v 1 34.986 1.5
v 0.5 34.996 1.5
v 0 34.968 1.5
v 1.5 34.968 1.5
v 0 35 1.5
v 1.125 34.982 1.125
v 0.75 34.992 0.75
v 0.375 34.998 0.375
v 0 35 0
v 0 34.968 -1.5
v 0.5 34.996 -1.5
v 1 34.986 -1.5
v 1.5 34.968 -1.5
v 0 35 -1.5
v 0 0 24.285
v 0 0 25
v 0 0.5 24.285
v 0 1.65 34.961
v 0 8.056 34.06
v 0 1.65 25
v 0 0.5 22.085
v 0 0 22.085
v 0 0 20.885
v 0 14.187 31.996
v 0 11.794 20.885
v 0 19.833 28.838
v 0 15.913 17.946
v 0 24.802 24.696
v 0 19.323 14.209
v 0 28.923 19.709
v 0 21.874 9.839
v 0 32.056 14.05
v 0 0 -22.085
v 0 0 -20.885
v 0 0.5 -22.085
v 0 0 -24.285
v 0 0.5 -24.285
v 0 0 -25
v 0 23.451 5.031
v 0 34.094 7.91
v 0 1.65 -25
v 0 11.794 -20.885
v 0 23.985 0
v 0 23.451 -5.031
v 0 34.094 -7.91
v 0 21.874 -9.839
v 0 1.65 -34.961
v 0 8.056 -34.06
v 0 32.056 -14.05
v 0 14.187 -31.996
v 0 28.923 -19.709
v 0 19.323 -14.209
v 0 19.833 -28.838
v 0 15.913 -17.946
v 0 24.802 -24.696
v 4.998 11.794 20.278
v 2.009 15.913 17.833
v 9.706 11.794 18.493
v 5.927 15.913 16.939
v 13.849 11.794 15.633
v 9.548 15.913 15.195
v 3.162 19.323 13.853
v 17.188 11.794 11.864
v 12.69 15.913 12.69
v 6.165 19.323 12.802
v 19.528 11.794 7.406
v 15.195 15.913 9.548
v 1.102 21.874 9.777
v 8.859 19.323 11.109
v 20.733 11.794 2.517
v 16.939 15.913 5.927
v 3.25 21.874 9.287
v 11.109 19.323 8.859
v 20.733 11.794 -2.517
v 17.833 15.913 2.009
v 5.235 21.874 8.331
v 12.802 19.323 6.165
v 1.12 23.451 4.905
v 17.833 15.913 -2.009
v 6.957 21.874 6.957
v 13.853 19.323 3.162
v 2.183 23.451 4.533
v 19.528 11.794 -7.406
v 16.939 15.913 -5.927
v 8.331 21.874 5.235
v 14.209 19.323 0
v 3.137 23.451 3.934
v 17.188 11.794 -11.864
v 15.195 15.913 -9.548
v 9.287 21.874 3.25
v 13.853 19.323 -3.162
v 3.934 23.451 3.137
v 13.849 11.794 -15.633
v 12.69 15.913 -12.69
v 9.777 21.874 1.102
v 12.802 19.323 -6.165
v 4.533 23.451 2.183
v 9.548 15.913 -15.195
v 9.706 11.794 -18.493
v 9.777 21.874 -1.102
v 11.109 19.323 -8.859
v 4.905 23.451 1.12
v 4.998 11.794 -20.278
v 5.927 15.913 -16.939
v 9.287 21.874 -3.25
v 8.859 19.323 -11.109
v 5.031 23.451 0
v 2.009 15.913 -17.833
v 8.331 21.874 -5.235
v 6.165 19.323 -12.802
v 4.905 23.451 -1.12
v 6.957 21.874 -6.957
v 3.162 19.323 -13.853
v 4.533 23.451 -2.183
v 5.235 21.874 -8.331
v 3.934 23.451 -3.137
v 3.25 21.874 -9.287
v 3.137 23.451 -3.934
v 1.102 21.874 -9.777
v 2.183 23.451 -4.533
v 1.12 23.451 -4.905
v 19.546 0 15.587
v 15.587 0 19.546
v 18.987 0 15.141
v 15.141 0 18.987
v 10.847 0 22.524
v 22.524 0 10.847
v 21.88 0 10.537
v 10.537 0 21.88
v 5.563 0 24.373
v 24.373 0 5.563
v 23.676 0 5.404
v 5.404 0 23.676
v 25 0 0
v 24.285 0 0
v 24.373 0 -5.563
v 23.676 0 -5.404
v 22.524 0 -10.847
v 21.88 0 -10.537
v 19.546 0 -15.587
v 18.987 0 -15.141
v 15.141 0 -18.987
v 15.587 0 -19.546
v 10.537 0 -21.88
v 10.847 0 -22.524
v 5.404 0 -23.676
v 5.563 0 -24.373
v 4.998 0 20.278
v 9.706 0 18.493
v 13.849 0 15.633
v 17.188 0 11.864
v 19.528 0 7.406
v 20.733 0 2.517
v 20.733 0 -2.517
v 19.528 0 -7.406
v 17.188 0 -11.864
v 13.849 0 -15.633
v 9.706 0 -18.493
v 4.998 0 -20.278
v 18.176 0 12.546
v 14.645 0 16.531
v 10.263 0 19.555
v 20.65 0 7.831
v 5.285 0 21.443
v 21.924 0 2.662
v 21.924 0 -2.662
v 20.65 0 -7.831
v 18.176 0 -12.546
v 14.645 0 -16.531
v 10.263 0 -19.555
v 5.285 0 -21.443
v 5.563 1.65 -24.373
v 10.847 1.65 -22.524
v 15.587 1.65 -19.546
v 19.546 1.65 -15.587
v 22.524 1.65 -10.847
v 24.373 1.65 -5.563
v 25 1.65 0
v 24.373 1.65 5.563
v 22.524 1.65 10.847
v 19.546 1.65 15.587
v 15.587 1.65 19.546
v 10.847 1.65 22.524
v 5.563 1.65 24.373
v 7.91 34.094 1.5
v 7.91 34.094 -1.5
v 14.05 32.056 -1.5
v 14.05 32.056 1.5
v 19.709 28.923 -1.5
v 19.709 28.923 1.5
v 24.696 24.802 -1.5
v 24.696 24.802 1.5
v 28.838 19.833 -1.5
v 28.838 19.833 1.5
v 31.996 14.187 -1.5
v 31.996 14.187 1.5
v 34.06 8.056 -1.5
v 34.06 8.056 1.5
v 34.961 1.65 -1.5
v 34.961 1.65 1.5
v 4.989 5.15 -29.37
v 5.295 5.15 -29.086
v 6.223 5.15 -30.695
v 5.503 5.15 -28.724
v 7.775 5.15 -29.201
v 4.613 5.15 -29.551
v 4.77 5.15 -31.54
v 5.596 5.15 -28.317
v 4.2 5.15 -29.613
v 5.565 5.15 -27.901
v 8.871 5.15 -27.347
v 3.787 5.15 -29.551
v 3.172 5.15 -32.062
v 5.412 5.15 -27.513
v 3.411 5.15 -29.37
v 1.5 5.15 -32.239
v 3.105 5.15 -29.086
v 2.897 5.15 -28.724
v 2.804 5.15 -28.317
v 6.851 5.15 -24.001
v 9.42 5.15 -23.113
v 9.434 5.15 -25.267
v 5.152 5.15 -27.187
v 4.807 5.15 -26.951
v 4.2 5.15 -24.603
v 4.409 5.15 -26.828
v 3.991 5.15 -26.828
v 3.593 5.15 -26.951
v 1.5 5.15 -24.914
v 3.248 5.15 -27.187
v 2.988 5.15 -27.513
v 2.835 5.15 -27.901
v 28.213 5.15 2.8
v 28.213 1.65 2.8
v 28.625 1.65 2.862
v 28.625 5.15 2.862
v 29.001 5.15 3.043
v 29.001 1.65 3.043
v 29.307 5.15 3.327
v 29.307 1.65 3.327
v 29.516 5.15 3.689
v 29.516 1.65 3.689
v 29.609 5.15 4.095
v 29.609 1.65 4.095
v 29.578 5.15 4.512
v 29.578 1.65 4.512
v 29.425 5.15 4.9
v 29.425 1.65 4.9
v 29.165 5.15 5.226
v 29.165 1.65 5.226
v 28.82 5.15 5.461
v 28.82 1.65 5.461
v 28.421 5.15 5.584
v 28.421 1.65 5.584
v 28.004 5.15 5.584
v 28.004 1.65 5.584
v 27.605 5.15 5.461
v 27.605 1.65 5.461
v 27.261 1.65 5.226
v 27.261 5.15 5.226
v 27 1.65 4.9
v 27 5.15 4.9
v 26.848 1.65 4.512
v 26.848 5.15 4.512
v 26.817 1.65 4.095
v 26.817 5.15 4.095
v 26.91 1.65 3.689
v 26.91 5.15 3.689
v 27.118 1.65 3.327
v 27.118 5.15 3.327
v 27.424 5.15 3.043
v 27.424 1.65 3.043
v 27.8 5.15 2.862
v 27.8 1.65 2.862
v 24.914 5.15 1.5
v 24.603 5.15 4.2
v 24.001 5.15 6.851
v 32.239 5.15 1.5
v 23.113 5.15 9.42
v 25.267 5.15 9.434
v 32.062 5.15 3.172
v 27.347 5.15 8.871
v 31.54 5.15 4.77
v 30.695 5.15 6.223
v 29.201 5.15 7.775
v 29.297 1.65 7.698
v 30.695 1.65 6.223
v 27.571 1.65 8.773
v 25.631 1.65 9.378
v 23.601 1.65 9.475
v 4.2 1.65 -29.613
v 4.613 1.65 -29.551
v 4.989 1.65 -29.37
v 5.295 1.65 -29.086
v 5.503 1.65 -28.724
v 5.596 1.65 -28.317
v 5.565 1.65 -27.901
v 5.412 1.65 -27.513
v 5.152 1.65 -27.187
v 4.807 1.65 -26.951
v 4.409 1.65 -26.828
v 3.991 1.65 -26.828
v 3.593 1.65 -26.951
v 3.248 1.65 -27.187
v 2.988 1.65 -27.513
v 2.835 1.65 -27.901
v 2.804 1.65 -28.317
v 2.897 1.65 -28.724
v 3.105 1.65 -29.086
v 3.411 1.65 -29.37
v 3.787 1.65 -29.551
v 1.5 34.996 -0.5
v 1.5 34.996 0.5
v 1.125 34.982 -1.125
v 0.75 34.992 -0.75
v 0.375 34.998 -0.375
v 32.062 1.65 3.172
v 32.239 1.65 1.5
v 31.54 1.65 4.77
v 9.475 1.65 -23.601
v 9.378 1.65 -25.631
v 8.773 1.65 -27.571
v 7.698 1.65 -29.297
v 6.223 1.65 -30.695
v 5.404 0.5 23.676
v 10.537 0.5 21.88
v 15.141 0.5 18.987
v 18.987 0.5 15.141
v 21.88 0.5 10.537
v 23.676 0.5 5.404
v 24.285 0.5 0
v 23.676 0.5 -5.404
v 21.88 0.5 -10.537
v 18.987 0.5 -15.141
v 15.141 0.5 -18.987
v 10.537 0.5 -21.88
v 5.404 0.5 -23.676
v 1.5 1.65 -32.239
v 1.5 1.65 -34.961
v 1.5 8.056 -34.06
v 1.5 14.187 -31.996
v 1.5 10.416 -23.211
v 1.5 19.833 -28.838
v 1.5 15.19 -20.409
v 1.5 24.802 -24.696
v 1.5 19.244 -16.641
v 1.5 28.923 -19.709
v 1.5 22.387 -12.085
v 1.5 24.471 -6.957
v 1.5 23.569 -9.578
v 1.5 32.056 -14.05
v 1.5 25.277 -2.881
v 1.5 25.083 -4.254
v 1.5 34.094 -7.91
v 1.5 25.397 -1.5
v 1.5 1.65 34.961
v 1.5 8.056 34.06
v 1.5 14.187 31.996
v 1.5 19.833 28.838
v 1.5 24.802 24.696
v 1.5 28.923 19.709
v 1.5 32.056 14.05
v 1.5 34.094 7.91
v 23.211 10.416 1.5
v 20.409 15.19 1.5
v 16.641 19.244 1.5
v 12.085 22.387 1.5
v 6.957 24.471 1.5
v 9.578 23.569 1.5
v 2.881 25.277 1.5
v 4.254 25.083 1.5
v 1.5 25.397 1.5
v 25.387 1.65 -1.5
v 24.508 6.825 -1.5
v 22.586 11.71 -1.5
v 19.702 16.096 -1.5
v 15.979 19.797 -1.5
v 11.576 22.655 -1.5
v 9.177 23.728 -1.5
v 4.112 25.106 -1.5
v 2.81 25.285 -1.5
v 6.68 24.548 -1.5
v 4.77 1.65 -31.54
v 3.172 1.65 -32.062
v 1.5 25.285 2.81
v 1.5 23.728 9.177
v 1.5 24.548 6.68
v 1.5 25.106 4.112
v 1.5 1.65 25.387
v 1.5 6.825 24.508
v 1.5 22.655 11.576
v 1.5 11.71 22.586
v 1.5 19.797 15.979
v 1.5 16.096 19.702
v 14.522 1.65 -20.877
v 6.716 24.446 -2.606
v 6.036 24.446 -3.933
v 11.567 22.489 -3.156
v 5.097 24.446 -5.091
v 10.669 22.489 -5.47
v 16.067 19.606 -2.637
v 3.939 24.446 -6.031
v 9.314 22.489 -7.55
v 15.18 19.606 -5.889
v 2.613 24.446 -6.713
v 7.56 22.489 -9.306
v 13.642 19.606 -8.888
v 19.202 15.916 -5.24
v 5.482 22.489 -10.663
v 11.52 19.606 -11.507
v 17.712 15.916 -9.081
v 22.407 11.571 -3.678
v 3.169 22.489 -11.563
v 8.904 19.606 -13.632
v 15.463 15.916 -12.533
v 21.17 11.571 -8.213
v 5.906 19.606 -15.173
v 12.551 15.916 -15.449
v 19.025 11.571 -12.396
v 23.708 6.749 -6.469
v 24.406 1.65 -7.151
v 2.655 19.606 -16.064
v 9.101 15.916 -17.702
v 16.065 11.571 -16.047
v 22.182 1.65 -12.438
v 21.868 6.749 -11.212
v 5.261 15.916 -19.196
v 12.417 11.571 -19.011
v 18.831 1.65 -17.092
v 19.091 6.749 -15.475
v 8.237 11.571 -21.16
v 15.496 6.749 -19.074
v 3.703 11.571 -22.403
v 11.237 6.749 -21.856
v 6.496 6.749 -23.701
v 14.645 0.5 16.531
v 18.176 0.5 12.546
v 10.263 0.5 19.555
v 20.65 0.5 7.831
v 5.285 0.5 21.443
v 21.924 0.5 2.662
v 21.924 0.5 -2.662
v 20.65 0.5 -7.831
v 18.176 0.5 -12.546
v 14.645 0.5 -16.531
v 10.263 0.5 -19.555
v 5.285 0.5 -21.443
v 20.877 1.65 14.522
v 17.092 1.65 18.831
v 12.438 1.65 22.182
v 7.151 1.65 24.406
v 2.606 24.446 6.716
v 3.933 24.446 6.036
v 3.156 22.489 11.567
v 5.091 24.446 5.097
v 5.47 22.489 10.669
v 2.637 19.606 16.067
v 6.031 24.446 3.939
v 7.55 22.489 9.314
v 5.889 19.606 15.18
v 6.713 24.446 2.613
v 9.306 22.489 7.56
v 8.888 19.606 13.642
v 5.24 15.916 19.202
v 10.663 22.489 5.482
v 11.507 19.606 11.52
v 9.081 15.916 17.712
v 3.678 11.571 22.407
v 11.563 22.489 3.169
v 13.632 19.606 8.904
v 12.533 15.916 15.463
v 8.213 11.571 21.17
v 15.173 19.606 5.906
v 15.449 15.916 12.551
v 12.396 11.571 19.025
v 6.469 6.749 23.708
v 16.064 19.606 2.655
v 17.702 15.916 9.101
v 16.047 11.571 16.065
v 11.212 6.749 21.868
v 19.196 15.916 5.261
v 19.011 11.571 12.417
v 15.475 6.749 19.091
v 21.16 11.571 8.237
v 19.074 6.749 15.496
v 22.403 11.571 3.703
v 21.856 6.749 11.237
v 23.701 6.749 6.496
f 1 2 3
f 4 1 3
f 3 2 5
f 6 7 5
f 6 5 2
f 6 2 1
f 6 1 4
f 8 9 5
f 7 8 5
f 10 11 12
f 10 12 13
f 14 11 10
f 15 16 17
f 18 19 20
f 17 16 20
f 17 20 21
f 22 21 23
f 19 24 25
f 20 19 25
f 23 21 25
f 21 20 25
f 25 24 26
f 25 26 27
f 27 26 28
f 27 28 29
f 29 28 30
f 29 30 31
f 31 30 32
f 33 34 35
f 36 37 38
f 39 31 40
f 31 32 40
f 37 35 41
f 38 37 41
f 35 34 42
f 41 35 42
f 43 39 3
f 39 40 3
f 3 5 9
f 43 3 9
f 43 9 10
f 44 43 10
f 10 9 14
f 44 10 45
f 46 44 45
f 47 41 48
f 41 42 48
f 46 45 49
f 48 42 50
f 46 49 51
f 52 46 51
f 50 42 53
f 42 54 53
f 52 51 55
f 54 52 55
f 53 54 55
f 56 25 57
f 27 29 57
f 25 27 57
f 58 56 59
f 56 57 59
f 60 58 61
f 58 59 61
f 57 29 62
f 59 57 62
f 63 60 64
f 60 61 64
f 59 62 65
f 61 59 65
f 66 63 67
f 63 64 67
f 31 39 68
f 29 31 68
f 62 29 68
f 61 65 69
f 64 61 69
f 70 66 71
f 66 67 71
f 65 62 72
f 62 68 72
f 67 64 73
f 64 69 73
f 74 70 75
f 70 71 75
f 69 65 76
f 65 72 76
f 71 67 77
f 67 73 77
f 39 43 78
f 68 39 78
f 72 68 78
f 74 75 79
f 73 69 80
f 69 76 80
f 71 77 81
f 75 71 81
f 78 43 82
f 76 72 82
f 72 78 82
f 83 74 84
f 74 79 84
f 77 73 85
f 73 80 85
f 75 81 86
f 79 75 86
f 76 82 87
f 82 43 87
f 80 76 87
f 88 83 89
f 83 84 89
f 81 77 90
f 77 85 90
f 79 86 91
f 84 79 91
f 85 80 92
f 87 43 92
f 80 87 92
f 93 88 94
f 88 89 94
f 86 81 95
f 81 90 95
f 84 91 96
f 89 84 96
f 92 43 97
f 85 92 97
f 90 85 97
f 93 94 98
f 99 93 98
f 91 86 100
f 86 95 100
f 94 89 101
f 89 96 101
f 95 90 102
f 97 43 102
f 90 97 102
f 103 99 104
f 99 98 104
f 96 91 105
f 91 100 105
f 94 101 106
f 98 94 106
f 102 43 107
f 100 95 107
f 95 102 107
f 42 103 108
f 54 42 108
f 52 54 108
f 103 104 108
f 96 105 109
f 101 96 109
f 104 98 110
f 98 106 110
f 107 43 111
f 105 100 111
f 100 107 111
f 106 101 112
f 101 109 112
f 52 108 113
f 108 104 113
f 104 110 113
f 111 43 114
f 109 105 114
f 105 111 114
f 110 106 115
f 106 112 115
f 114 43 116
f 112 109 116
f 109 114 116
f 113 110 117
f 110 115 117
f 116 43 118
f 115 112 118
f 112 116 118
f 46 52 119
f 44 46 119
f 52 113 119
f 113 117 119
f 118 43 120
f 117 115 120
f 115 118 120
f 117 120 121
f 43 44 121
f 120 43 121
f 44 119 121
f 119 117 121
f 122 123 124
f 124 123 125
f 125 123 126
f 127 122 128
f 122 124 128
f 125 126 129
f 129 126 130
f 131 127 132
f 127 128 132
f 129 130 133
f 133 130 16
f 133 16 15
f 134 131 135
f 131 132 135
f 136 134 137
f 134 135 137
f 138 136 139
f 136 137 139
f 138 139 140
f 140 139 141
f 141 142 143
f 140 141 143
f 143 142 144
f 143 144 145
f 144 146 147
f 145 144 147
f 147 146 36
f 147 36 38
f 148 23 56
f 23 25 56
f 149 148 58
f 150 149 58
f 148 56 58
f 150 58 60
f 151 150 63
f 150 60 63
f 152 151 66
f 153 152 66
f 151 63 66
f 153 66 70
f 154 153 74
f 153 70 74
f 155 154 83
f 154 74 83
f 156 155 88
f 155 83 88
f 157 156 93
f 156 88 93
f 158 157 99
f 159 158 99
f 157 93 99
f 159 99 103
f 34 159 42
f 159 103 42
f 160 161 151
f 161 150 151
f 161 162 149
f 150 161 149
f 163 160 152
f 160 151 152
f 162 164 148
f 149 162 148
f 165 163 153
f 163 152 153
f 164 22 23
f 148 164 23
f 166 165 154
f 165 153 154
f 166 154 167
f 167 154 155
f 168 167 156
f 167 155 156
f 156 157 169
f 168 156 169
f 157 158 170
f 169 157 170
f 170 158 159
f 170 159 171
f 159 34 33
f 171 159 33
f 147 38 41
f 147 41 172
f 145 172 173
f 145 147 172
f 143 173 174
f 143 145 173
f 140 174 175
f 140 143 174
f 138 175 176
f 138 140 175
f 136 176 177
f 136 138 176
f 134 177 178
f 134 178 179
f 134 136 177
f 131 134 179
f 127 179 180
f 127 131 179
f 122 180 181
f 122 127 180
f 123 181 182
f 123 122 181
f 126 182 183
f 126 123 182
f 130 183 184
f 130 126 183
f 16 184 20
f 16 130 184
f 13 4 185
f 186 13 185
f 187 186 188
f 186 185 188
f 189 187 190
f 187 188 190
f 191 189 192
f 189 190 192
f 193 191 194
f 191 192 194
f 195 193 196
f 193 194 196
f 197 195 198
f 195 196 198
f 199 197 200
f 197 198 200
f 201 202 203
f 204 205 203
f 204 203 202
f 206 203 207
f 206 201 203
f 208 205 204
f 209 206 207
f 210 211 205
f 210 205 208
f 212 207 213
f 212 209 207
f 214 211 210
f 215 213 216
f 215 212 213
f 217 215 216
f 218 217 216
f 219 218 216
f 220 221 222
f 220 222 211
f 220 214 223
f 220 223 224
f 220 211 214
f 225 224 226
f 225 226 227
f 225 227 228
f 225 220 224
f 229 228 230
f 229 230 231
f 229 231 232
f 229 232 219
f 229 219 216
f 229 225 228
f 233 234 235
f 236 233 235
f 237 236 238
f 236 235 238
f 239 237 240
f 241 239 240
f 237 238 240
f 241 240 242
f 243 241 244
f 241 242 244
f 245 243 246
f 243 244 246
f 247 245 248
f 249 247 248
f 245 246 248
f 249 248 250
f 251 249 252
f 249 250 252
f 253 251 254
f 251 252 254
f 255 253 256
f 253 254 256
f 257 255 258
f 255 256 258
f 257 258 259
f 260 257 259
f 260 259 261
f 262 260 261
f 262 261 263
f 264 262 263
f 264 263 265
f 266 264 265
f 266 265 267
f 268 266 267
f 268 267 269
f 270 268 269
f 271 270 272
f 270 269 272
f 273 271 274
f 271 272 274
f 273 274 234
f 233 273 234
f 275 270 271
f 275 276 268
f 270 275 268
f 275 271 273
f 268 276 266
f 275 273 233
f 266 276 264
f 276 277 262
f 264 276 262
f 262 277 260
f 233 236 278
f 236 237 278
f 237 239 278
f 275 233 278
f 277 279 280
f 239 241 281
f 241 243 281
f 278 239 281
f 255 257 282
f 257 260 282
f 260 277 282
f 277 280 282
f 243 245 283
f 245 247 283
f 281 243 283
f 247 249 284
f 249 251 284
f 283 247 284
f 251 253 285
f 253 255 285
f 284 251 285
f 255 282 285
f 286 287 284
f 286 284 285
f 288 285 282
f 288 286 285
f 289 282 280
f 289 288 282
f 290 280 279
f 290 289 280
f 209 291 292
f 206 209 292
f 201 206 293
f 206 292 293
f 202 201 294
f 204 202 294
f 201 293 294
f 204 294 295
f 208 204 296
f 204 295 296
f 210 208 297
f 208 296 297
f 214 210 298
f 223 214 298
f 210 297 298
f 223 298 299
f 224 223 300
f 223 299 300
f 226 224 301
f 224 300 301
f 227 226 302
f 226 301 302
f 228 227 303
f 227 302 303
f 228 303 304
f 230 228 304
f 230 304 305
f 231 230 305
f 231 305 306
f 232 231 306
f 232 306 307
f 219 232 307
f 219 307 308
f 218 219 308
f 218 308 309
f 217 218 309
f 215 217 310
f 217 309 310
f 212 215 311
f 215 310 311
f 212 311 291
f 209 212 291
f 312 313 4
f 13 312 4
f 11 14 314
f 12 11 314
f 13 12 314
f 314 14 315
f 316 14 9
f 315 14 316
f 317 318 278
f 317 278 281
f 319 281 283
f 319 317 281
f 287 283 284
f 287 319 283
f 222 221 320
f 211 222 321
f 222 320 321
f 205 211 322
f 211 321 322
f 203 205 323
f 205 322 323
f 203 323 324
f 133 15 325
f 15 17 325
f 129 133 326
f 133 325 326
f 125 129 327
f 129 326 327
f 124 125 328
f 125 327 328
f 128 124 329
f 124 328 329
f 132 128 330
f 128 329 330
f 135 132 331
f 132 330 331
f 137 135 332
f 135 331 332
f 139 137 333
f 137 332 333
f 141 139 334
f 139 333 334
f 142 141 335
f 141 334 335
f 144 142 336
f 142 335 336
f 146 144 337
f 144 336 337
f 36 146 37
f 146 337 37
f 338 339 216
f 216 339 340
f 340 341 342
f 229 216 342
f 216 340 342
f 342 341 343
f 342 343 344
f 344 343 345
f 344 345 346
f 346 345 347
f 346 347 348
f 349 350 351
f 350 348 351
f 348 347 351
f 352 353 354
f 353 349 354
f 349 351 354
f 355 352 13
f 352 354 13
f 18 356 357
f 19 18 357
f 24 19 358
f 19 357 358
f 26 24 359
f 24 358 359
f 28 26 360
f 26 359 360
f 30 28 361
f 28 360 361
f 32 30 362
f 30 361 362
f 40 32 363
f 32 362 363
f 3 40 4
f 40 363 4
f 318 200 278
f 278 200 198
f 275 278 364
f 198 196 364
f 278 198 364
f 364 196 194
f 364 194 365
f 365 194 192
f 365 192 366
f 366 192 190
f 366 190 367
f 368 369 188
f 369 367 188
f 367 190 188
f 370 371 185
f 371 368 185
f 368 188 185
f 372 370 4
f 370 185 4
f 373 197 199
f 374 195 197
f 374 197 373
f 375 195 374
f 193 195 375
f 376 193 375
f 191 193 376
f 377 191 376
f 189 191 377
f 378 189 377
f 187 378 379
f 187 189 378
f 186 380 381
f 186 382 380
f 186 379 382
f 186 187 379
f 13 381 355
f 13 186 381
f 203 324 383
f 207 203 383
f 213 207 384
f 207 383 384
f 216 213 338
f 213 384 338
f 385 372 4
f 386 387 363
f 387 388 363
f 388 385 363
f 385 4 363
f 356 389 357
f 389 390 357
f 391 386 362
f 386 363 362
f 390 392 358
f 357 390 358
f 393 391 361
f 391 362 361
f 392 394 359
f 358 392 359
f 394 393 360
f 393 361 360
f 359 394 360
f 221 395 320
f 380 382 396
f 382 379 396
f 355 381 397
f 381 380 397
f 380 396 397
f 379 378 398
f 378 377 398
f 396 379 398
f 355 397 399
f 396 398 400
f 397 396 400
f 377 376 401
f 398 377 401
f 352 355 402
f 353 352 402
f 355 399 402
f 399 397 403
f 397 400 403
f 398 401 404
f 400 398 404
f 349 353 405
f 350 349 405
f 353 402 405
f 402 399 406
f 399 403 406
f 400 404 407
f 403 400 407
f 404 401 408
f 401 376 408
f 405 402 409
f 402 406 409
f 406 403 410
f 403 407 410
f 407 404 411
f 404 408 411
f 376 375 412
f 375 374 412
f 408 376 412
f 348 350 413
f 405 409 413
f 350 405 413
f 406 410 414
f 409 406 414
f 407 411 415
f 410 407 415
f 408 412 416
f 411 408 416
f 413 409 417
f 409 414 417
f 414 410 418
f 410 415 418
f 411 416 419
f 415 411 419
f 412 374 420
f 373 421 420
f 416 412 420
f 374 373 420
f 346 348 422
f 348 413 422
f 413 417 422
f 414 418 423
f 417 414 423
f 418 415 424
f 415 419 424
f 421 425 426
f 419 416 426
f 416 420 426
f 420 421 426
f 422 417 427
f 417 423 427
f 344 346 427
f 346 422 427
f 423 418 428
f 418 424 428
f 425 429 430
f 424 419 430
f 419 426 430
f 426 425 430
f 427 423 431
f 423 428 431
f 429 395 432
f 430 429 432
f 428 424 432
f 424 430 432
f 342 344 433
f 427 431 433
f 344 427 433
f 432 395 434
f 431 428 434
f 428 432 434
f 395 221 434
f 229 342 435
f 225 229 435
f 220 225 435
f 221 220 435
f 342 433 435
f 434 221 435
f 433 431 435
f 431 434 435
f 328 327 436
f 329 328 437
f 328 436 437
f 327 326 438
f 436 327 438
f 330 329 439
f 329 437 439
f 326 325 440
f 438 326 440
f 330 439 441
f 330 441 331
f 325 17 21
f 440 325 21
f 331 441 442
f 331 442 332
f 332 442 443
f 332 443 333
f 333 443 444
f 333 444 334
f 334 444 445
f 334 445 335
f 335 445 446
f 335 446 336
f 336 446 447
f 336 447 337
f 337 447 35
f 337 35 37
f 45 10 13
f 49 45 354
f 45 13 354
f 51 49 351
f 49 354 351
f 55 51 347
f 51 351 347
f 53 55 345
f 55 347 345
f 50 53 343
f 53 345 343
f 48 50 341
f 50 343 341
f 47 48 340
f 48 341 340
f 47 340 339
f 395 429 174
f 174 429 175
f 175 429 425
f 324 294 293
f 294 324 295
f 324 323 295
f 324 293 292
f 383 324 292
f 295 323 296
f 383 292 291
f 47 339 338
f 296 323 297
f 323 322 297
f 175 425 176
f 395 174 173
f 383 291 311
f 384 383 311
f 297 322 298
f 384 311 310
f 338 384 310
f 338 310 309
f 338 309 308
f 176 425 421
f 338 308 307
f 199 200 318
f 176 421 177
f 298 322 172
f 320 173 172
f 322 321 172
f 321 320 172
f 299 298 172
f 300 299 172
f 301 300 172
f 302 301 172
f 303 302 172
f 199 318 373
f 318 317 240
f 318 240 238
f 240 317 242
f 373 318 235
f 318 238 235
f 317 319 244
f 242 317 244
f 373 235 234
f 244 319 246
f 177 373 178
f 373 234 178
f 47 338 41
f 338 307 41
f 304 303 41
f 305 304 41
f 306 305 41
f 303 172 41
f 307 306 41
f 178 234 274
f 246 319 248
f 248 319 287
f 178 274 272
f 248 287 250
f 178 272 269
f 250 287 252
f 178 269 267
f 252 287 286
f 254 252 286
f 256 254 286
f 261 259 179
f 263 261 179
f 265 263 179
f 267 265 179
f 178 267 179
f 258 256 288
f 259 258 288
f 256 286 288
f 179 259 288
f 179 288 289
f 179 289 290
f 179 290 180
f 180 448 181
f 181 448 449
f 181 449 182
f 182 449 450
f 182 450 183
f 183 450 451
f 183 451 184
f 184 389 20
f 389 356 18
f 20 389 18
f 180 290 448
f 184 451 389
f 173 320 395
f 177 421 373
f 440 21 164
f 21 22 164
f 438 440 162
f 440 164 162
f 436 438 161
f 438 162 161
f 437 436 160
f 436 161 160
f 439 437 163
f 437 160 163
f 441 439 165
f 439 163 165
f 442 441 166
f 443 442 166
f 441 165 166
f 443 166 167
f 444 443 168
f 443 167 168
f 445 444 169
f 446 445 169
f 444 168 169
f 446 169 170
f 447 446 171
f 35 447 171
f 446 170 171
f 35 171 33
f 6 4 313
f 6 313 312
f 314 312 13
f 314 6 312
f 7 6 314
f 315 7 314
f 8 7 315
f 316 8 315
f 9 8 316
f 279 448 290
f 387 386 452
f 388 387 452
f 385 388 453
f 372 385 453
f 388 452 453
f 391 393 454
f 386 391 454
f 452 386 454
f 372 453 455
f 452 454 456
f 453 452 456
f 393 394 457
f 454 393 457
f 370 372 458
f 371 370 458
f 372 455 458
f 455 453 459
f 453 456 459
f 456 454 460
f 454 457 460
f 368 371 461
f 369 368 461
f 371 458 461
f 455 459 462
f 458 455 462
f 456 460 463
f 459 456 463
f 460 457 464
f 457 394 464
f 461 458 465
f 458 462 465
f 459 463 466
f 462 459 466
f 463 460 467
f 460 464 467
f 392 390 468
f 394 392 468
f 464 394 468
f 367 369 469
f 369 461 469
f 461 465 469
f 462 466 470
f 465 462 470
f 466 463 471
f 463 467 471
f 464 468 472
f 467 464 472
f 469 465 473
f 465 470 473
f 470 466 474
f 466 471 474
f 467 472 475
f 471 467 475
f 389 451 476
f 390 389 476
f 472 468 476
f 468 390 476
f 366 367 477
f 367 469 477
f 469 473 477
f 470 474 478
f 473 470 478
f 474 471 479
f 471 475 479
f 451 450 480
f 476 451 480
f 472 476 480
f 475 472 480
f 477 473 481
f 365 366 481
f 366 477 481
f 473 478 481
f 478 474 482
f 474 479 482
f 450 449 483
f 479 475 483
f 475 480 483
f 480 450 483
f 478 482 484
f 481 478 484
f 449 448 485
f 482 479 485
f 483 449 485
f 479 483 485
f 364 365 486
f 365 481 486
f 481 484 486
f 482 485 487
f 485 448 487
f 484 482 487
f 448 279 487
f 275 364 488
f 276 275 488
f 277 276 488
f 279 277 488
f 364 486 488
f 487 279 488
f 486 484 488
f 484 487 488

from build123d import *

# Parameters (mm, degrees)
BOSS_EXTRUDE1_DEPTH      = 1.5
BOSS_EXTRUDE1_DEPTH_BACK = 1.5
BOSS_EXTRUDE2_DEPTH      = 1.5
BOSS_EXTRUDE2_DEPTH_BACK = 1.5
SKETCH4_W                = 11.052180397
SKETCH4_H                = 1.65
SKETCH5_R                = 1.4
BOSS_EXTRUDE20_DEPTH     = 3.5
SKETCH6_R                = 26
SKETCH6_R_2              = 25
CUT_EXTRUDE1_DEPTH       = 1.65


with BuildPart() as part:
    # Sketch1 → Revolve1 (revolve)
    with BuildSketch(Plane.XY, mode=Mode.PRIVATE) as revolve1_sk:
        with BuildLine():
            Line((-20.885, 0), (-20.885, 11.793939121))
            ThreePointArc((-20.885, 11.793939121), (-12.091372858, 20.714220415), (0, 23.985))
            Line((0, 23.985), (0, 25.485))
            ThreePointArc((0, 25.485), (-18.020616319, 18.020616319), (-25.485, 0))
            Line((-25.485, 0), (-24.285, 0))
            Line((-24.285, 0), (-24.285, 0.5))
            Line((-24.285, 0.5), (-22.085, 0.5))
            Line((-22.085, 0.5), (-22.085, 0))
            Line((-22.085, 0), (-20.885, 0))
        make_face()
    revolve(revolve1_sk.sketch.rotate(Axis((0, 0, 0), (0, 1, 0)), 270), axis=Axis((0, 0, 0), (0, 1, 0)))



with BuildPart() as body_2:
    # Sketch2 → Boss-Extrude1 (new, two sides)
    with BuildSketch(Plane.XY) as boss_extrude1_sk:
        with BuildLine():
            Line((-24.9, 0), (-35, 0))
            ThreePointArc((-35, 0), (0, 35), (35, 0))
            Line((35, 0), (24.9, 0))
            ThreePointArc((24.9, 0), (0, 24.9), (-24.9, 0))
        make_face()
    extrude(amount=BOSS_EXTRUDE1_DEPTH)
    extrude(boss_extrude1_sk.sketch, amount=-BOSS_EXTRUDE1_DEPTH_BACK)

    # Sketch3 → Boss-Extrude2 (add, two sides)
    with BuildSketch(Plane(origin=(0, 0, 0), x_dir=(0, 0, -1), z_dir=(1, 0, 0))) as boss_extrude2_sk:
        with BuildLine():
            Line((35, 0), (24.9, 0))
            ThreePointArc((24.9, 0), (0, 24.9), (-24.9, 0))
            Line((-24.9, 0), (-35, 0))
            ThreePointArc((-35, 0), (0, 35), (35, 0))
        make_face()
    extrude(amount=BOSS_EXTRUDE2_DEPTH)
    extrude(boss_extrude2_sk.sketch, amount=-BOSS_EXTRUDE2_DEPTH_BACK)

    # Sketch4 → Cut-Revolve2 (revolve, cut)
    with BuildSketch(Plane.XY):
        with Locations((-30.371361379, 0.825)):
            Rectangle(SKETCH4_W, SKETCH4_H)
    revolve(axis=Axis((0, 0, 0), (0, 1, 0)), mode=Mode.SUBTRACT)


with BuildPart() as part_1:
    add(part.part)

    add(body_2.part)  # Boss-Extrude20 merges body 2
    # Sketch5 → Boss-Extrude20 (add)
    with BuildSketch(Plane.XZ.offset(-1.65)):
        with BuildLine():
            Line((-32.23863084, -1.5), (-24.23863084, -1.5))
            ThreePointArc((-24.23863084, -1.5), (-23.660511509, -5.471875377), (-22.4360777, -9.294280094))
            ThreePointArc((-22.4360777, -9.294280094), (-27.026694315, -8.998446643), (-30.695451754, -6.223289498))
            ThreePointArc((-30.695451754, -6.223289498), (-31.843056108, -3.984495189), (-32.23863084, -1.5))
        make_face()
        with Locations(Location((-28.212839525, -4.2, 0), (0, 0, 270))):
            Circle(SKETCH5_R, mode=Mode.SUBTRACT)
        with BuildLine():
            Line((24.23863084, 1.5), (32.23863084, 1.5))
            ThreePointArc((32.23863084, 1.5), (31.843056108, 3.984495189), (30.695451754, 6.223289498))
            ThreePointArc((30.695451754, 6.223289498), (27.026694315, 8.998446643), (22.4360777, 9.294280094))
            ThreePointArc((22.4360777, 9.294280094), (23.660511509, 5.471875377), (24.23863084, 1.5))
        make_face()
        with Locations(Location((28.212839525, 4.2, 0), (0, 0, 270))):
            Circle(SKETCH5_R, mode=Mode.SUBTRACT)
        with BuildLine():
            Line((-1.5, 32.23863084), (-1.5, 24.23863084))
            ThreePointArc((-1.5, 24.23863084), (-5.471875377, 23.660511509), (-9.294280094, 22.4360777))
            ThreePointArc((-9.294280094, 22.4360777), (-8.998446643, 27.026694315), (-6.223289498, 30.695451754))
            ThreePointArc((-6.223289498, 30.695451754), (-3.984495189, 31.843056108), (-1.5, 32.23863084))
        make_face()
        with Locations(Location((-4.2, 28.212839525, 0), (0, 0, 270))):
            Circle(SKETCH5_R, mode=Mode.SUBTRACT)
        with BuildLine():
            Line((1.5, -32.23863084), (1.5, -24.23863084))
            ThreePointArc((1.5, -24.23863084), (5.471875377, -23.660511509), (9.294280094, -22.4360777))
            ThreePointArc((9.294280094, -22.4360777), (8.998446643, -27.026694315), (6.223289498, -30.695451754))
            ThreePointArc((6.223289498, -30.695451754), (3.984495189, -31.843056108), (1.5, -32.23863084))
        make_face()
        with Locations(Location((4.2, -28.212839525, 0), (0, 0, 270))):
            Circle(SKETCH5_R, mode=Mode.SUBTRACT)
    extrude(amount=-BOSS_EXTRUDE20_DEPTH)

    # Sketch6 → Cut-Extrude1 (cut)
    with BuildSketch(Plane.XZ):
        Circle(SKETCH6_R)
        with Locations(Location((0, 0, 0), (0, 0, 270))):
            Circle(SKETCH6_R_2, mode=Mode.SUBTRACT)
    extrude(amount=-CUT_EXTRUDE1_DEPTH, mode=Mode.SUBTRACT)

    # SurfaceCut1
    split(bisect_by=Plane(origin=(0, 0, 0), x_dir=(0, 0, -1), z_dir=(1, 0, 0)), keep=Keep.TOP)


solid = part_1.part
